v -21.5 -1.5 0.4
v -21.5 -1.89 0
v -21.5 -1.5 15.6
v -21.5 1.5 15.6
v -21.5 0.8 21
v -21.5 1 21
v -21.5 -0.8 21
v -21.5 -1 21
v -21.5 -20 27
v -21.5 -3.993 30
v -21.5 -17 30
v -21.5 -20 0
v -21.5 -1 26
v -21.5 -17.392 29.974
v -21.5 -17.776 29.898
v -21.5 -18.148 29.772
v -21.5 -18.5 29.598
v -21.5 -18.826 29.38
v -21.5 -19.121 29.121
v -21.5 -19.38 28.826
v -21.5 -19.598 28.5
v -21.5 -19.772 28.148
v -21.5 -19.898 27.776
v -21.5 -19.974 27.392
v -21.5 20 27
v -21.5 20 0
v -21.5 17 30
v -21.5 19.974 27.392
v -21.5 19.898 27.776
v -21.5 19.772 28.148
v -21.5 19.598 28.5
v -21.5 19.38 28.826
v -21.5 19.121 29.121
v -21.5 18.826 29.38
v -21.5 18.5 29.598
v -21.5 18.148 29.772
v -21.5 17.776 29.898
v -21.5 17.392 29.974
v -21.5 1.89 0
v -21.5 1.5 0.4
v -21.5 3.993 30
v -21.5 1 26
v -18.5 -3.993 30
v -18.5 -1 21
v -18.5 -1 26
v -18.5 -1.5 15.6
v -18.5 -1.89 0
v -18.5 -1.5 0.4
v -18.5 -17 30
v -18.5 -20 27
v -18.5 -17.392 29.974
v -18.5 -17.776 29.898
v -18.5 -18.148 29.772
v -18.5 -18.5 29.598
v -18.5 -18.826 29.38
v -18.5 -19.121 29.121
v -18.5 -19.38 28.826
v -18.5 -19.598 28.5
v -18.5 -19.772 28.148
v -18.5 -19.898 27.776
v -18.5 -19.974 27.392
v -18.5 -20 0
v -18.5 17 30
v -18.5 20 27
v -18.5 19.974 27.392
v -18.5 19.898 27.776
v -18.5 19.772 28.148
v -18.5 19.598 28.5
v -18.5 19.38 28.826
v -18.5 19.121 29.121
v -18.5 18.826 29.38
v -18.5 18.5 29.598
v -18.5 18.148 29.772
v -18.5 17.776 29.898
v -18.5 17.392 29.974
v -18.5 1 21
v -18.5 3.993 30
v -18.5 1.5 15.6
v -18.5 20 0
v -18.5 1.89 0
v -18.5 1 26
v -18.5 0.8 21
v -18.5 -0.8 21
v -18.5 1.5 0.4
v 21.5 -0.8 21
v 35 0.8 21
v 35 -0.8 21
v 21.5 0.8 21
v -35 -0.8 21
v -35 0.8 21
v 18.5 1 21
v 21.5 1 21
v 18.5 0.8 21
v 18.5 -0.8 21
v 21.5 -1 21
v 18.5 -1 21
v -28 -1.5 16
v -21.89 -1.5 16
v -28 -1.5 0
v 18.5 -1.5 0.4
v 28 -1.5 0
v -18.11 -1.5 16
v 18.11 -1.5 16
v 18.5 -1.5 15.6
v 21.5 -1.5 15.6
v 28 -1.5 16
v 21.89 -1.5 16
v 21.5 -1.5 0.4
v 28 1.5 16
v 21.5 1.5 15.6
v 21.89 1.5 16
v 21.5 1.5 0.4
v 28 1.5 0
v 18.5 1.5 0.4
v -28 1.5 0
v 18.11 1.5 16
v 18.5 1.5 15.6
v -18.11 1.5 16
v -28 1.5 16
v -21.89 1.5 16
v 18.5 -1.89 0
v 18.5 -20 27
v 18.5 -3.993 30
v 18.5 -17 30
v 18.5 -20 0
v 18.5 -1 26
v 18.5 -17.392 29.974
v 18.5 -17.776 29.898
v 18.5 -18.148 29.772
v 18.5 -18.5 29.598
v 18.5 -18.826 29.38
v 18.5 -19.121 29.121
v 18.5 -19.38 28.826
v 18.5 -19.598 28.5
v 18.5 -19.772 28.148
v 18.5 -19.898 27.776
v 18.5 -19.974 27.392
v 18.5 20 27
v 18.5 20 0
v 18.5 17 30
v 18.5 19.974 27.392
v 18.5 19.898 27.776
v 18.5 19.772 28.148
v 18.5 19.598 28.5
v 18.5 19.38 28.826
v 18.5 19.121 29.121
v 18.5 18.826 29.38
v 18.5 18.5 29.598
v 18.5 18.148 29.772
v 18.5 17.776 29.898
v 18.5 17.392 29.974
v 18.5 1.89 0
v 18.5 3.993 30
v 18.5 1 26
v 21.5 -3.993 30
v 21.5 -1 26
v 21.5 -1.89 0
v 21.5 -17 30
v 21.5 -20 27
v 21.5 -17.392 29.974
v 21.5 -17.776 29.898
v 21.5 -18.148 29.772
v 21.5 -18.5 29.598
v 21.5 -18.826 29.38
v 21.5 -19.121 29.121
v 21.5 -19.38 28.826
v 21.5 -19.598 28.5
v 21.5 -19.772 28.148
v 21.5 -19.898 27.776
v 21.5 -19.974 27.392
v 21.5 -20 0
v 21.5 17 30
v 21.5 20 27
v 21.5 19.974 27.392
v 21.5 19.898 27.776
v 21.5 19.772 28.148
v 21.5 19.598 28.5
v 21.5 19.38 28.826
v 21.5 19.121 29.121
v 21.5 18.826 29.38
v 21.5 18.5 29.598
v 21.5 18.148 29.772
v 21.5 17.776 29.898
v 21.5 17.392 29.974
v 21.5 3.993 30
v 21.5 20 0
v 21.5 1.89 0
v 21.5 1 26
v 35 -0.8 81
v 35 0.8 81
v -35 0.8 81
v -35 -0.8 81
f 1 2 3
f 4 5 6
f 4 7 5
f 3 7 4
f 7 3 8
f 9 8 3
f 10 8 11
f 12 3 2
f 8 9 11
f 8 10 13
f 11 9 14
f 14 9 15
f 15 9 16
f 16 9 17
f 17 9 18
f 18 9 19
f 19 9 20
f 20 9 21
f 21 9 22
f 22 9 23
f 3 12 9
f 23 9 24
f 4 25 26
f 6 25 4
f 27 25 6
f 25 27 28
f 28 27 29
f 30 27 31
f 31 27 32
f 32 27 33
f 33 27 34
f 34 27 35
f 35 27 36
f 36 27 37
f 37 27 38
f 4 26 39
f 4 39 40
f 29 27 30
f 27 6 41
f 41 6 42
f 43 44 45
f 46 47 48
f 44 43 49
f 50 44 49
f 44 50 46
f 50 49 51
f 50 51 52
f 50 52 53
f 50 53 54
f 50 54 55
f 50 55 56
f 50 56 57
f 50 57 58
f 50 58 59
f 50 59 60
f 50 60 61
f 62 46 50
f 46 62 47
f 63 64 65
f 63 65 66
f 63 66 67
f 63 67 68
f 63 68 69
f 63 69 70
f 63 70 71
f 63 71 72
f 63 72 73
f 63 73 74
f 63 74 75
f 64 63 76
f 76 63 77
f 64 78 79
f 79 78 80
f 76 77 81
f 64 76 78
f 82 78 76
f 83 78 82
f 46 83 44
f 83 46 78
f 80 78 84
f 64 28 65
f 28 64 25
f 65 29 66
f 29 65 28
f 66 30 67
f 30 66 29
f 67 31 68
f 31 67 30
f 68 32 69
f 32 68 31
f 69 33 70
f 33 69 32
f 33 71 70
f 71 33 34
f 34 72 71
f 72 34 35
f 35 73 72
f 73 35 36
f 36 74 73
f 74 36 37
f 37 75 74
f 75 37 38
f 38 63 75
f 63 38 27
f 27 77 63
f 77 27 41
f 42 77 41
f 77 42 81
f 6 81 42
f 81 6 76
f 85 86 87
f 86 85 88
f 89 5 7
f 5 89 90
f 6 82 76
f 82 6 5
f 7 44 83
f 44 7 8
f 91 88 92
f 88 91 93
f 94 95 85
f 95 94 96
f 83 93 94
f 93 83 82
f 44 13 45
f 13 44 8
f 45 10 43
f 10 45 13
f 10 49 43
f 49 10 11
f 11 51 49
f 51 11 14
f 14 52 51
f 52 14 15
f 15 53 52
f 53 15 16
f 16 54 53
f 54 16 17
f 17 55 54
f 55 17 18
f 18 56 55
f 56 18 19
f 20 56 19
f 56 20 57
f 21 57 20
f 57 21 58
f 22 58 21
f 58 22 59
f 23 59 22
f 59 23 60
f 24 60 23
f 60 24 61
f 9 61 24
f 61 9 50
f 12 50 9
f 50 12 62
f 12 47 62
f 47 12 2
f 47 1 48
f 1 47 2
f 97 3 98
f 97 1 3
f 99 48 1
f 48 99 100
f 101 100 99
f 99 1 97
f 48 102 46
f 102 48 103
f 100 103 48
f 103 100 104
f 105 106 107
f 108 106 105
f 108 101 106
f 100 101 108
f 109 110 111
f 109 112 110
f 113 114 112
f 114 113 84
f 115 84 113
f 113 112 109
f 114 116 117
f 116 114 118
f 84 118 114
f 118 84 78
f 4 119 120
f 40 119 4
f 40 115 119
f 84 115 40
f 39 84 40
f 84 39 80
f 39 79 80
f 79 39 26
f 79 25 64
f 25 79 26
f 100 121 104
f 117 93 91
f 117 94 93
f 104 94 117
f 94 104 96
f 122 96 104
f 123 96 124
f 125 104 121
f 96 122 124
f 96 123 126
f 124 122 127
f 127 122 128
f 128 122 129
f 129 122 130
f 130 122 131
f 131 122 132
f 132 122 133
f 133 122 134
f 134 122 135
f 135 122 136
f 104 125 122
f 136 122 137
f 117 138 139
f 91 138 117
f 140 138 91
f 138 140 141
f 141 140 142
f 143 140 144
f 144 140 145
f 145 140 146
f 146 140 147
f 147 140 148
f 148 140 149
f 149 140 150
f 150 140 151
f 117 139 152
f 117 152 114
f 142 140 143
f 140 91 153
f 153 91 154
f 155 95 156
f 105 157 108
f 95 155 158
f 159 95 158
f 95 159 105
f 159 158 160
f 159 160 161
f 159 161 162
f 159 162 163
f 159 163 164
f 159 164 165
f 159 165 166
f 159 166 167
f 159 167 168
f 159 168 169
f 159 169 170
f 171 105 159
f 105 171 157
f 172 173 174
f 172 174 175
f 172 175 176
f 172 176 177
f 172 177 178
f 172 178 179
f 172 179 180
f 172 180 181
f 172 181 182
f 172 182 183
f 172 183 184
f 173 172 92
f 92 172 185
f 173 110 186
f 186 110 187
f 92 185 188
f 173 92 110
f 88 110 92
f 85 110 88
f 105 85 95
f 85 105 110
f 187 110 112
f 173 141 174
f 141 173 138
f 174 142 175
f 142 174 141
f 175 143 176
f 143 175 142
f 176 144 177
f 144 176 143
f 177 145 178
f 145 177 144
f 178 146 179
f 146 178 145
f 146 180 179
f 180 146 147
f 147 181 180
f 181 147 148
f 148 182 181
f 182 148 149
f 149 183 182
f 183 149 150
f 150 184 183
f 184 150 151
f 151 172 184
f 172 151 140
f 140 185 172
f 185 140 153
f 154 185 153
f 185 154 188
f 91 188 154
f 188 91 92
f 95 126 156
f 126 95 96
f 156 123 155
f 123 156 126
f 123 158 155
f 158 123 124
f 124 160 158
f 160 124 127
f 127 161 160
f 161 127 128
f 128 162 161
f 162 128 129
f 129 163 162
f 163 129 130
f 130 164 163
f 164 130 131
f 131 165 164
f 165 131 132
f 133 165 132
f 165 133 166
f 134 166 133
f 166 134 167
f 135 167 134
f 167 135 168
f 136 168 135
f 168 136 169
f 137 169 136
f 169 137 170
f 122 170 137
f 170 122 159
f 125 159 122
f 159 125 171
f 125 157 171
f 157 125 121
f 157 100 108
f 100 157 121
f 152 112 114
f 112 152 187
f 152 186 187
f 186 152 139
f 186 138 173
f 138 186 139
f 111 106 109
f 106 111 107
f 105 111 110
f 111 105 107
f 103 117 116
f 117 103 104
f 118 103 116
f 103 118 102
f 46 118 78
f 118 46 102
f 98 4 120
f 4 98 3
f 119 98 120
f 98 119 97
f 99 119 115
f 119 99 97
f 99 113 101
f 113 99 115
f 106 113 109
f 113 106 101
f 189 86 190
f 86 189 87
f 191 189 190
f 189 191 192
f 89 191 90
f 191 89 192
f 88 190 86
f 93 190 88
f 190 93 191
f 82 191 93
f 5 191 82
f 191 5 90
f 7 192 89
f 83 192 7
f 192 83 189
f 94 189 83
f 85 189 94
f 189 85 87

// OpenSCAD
// Badge turntable stand — parametric, laser-cut from 3 mm acrylic
//
// Two upright "cups" pocket the bottom edge of the badge; a crossbar
// half-laps into both to hold them upright at a set spacing.
//
// The same stand can be made in a web page, with a live preview and one SVG
// holding both the cuts and the engraving:
//   https://hamster.github.io/badges/edit/turntable-setup/#stand
//
// MODES (set `mode` or use the Customizer):
//   "assembly" – 3D preview of the stand at `preview_spacing`, with a ghost badge
//   "cut"      – 2D sheet layout of all cut outlines  -> F6, File > Export > SVG
//   "engrave"  – 2D labels only, same positions         -> export as second SVG
//   "comb"     – the test comb's outline on its own, to cut first and find
//                `slot_w`; its gaps widen from `comb_from` left to right
//
// In LightBurn: import cut.svg and engrave.svg, put the cut file on a cut
// layer and the engrave file on a low-power line layer. To line the two up,
// turn on `registration` before exporting both: it adds a tiny square at two
// opposite corners of each, so they import with the same bounds. Delete the
// squares once they're aligned.
//
// Numbers use sliders with a step so the Customizer takes decimals: it
// treats a plain number like 3.0 as a whole number and won't step below 1.

/* [Mode] */
mode = "assembly"; // [assembly, cut, engrave, comb]
preview_spacing = 40; // [20, 40, 60, 80]

/* [Material] */
// Nominal sheet thickness (for the 3D preview)
thickness = 3.0;   // [1:0.05:10]
// Half-lap slot width as cut: the comb tooth that fits snugly
slot_w    = 3.0;   // [1:0.05:10]
// Chamfer at the slot mouths
lead      = 0.4;   // [0:0.05:2]

/* [Crossbars] */
// Centre-to-centre cup spacing, one crossbar each
spacings  = [20, 40, 60];
// Crossbar height (keep below the badge's bottom edge)
cb_h      = 16;    // [6:0.5:40]
// Crossbar overhang past each slot centre
cb_end    = 8;     // [3:0.5:30]

/* [Uprights / cups] */
// Depth (front-to-back footprint)
up_l      = 40;    // [10:0.5:120]
// Height
up_h      = 30;    // [10:0.5:120]
// Top corner radius
up_r      = 3;     // [0:0.5:20]
num_uprights = 2;  // [1:1:6]

/* [Badge notch] */
// Narrow pocket width (1.6 mm PCB + clearance)
pocket_w  = 2.0;   // [0.5:0.05:10]
// Narrow pocket depth
pocket_d  = 5.0;   // [0:0.5:30]
// Flare width at the top edge
flare_w   = 8.0;   // [0.5:0.5:40]
// Flare (lead-in) depth
flare_d   = 4.0;   // [0:0.5:30]

/* [Test comb] */
include_comb = true;
// Narrowest tooth gap
comb_from    = 2.8;  // [0.5:0.05:10]
// Step between gaps
comb_step    = 0.1;  // [0.01:0.01:1]
// Number of gaps
comb_count   = 6;    // [1:1:12]

/* [Layout] */
// Spacing between parts on the sheet
gap        = 4;    // [1:0.5:20]
// Engraved spacing label height
label_size = 4;    // [1:0.5:10]
font       = "Liberation Sans:style=Bold";
// Tiny squares at two corners, to align the cut and engrave exports
registration = false;

/* [Hidden] */
$fn = 48;
lap = cb_h / 2;   // half-lap depth on both parts
eps = 0.01;
comb_widths = [for (i = [0 : comb_count - 1]) round((comb_from + i * comb_step) * 100) / 100];

// ---------------------------------------------------------------- 2D parts

// Open slot cut from an edge. Drawn opening "up" from y=0 into +y; caller
// mirrors/translates. Includes a small lead-in chamfer at the mouth.
module slot2d(w, depth) {
    s = w / 2;
    polygon([
        [-s - lead, -eps], [ s + lead, -eps],
        [ s, lead], [ s, depth], [-s, depth], [-s, lead]
    ]);
}

module upright2d() {
    difference() {
        // body with rounded top corners
        hull() {
            square([up_l, eps]);
            if (up_r > 0) {
                translate([up_r, up_h - up_r]) circle(r = up_r);
                translate([up_l - up_r, up_h - up_r]) circle(r = up_r);
            } else {
                translate([0, up_h - eps]) square([up_l, eps]);
            }
        }
        // badge notch: flare + pocket, from the top
        translate([up_l / 2, up_h])
            polygon([
                [-flare_w / 2,  eps], [ flare_w / 2,  eps],
                [ pocket_w / 2, -flare_d],
                [ pocket_w / 2, -flare_d - pocket_d],
                [-pocket_w / 2, -flare_d - pocket_d],
                [-pocket_w / 2, -flare_d]
            ]);
        // half-lap slot from the bottom
        translate([up_l / 2, 0]) slot2d(slot_w, lap);
    }
}

function cb_len(sp) = sp + 2 * cb_end;

module crossbar2d(sp) {
    difference() {
        square([cb_len(sp), cb_h]);
        for (c = [cb_end, cb_end + sp])
            translate([c, cb_h]) mirror([0, 1]) slot2d(slot_w, lap);
    }
}

module crossbar_label2d(sp) {
    translate([cb_len(sp) / 2, 2])
        text(str(sp), size = label_size, font = font,
             halign = "center", valign = "baseline");
}

// 9 mm apart, or more for wide gaps, so the teeth stay at least 5.5 mm.
comb_pitch = max(9, comb_widths[comb_count - 1] + 5.5);
comb_h = 16;
comb_depth = 8;
function comb_len() = comb_pitch * (comb_count + 1);

module comb2d() {
    difference() {
        square([comb_len(), comb_h]);
        for (i = [0 : comb_count - 1])
            translate([comb_pitch * (i + 1) - comb_widths[i] / 2,
                       comb_h - comb_depth])
                square([comb_widths[i], comb_depth + eps]);
    }
}

function fmt1(v) = v == floor(v) ? str(v, ".0") : str(v);

module comb_labels2d() {
    for (i = [0 : comb_count - 1])
        translate([comb_pitch * (i + 1), 1.5])
            text(fmt1(comb_widths[i]), size = 2.4, font = font,
                 halign = "center", valign = "baseline");
}

// ---------------------------------------------------------------- layout

// cumulative x offsets for the crossbar row
function cb_x(i) = i == 0 ? 0 : cb_x(i - 1) + cb_len(spacings[i - 1]) + gap;

row_cb_y   = 0;
row_comb_y = -(comb_h + gap);
row_up_y   = cb_h + gap;

module sheet(engrave = false) {
    // uprights (top row)
    if (!engrave)
        for (i = [0 : num_uprights - 1])
            translate([i * (up_l + gap), row_up_y]) upright2d();
    // crossbars (middle row)
    for (i = [0 : len(spacings) - 1])
        translate([cb_x(i), row_cb_y])
            if (engrave) crossbar_label2d(spacings[i]);
            else crossbar2d(spacings[i]);
    // test comb (bottom row)
    if (include_comb)
        translate([0, row_comb_y])
            if (engrave) comb_labels2d(); else comb2d();
    if (registration) reg();
}

// tiny squares at the layout's extreme corners so the cut and engrave
// exports import with identical bounds (delete after aligning)
module reg() {
    w = max(num_uprights * (up_l + gap), cb_x(len(spacings)),
            include_comb ? comb_len() : 0);
    bottom = include_comb ? row_comb_y : row_cb_y;
    for (p = [[-2, bottom - 2], [w, row_up_y + up_h + 2 - 0.5]])
        translate(p) square(0.5);
}

// ---------------------------------------------------------------- 3D assembly
// Badge plane = XZ. Crossbar runs along X; uprights run along Y.

module assembly(sp) {
    T = thickness;
    // crossbar, centred on origin
    color("LightBlue", 0.6)
        translate([-cb_len(sp) / 2, T / 2, 0]) rotate([90, 0, 0])
            linear_extrude(T) crossbar2d(sp);
    // uprights
    for (x = [-sp / 2, sp / 2])
        color("LightCyan", 0.6)
            translate([x - T / 2, -up_l / 2, 0]) rotate([90, 0, 90])
                linear_extrude(T) upright2d();
    // ghost badge sitting in the pockets
    badge_w = sp + 30;
    color("SeaGreen", 0.35)
        translate([-badge_w / 2, -0.8, up_h - flare_d - pocket_d])
            cube([badge_w, 1.6, 60]);
}

// ---------------------------------------------------------------- main
if (mode == "assembly") assembly(preview_spacing);
else if (mode == "cut") sheet(false);
else if (mode == "engrave") sheet(true);
else if (mode == "comb") comb2d();
